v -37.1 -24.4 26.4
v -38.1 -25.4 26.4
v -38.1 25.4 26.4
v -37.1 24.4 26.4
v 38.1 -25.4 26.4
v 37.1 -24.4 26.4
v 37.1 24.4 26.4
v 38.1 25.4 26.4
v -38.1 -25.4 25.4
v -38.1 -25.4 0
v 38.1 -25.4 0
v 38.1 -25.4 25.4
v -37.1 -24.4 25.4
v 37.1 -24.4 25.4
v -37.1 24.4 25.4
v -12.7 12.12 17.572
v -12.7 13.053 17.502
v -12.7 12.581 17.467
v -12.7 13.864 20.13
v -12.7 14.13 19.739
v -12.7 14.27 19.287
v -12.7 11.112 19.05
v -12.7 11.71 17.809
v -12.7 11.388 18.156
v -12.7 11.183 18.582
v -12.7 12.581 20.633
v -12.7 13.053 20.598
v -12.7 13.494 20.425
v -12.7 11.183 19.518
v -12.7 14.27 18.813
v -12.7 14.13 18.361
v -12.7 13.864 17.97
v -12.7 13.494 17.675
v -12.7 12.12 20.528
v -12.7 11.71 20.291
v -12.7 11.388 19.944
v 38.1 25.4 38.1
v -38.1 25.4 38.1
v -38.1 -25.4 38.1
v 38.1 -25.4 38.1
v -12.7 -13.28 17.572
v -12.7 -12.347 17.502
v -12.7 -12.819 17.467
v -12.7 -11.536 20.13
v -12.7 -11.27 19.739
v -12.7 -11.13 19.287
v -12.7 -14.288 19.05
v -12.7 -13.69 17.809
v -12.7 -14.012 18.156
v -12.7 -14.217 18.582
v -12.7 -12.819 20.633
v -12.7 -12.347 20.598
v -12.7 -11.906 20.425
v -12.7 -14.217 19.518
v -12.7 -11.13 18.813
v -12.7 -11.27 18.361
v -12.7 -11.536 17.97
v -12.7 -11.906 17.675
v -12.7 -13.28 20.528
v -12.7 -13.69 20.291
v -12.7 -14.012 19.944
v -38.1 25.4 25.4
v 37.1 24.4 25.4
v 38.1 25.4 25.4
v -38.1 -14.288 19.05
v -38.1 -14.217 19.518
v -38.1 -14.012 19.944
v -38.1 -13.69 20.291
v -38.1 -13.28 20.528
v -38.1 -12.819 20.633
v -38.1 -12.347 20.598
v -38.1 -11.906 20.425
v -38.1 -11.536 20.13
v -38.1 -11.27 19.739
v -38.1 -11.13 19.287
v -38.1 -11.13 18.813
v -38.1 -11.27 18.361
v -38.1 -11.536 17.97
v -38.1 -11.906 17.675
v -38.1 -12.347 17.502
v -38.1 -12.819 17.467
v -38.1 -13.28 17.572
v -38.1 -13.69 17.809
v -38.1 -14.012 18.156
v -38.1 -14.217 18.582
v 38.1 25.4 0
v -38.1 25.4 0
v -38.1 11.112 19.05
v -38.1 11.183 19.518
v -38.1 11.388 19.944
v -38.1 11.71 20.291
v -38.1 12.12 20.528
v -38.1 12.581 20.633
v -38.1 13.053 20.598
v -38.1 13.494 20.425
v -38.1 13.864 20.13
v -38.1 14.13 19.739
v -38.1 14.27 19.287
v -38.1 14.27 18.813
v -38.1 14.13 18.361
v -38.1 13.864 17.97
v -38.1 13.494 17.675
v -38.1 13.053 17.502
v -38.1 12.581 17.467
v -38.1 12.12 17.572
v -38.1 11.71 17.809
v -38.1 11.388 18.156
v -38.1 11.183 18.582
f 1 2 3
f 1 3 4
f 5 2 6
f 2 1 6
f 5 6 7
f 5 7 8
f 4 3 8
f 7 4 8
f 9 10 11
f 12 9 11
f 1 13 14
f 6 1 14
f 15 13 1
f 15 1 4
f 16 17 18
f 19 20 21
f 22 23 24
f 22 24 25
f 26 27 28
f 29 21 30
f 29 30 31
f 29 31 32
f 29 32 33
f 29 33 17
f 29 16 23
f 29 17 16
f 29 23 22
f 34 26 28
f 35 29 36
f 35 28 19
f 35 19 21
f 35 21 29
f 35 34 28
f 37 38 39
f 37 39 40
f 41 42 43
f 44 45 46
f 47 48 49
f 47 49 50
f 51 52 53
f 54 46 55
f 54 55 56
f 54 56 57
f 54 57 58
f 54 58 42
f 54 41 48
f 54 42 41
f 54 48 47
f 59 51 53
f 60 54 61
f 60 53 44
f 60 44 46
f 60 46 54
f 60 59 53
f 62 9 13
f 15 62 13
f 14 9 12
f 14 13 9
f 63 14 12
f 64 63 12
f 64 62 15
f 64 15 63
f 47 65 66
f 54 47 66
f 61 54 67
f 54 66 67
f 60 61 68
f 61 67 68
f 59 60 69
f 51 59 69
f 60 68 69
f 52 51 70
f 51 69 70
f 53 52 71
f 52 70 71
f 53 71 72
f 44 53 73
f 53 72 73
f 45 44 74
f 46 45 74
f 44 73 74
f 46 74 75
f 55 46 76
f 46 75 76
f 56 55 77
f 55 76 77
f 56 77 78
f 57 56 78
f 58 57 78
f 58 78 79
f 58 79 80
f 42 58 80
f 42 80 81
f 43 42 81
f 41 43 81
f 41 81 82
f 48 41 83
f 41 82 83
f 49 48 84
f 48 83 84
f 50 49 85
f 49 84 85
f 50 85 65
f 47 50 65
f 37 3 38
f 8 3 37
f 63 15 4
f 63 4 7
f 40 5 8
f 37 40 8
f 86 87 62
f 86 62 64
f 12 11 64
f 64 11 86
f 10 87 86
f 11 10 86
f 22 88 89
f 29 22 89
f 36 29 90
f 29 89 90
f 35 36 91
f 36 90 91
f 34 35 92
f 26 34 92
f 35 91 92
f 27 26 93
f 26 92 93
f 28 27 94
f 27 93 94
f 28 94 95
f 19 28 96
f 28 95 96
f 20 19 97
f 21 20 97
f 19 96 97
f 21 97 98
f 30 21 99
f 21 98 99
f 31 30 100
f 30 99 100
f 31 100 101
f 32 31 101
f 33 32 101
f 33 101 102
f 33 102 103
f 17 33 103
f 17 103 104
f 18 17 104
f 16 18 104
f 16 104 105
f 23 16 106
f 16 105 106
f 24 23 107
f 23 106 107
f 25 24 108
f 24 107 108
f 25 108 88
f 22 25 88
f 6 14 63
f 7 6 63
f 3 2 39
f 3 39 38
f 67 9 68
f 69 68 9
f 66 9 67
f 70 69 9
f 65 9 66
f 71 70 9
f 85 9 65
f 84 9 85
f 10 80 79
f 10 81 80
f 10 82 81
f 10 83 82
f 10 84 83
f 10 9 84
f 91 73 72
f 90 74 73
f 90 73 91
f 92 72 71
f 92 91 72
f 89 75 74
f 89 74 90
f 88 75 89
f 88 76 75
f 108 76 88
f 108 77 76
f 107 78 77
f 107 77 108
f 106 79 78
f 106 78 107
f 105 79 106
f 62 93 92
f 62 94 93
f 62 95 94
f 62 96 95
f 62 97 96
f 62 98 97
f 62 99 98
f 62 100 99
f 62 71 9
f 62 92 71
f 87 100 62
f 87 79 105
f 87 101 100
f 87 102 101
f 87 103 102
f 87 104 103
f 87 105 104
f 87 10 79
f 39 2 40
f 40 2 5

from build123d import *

# Parameters (mm, degrees)
F0_W     = 76.2
F0_H     = 50.8
F1_DEPTH = 38.1
F4_W     = 76.2
F4_H     = 50.8
F4_W_2   = 74.2
F4_H_2   = 48.8
F5_DEPTH = 1
F2_R     = 1.5875
F6_DEPTH = 25.4


with BuildPart() as f1:
    # F0 (on Top) → F1 (new body)
    with BuildSketch(Plane.XY):
        Rectangle(F0_W, F0_H)
    extrude(amount=F1_DEPTH)

    # F4 (on offset) → F5 (cut)
    with BuildSketch(Plane.XY.offset(25.4)):
        Rectangle(F4_W, F4_H)
        Rectangle(F4_W_2, F4_H_2, mode=Mode.SUBTRACT)
    extrude(amount=F5_DEPTH, mode=Mode.SUBTRACT)

    # F2 (on face) → F6 (cut)
    with BuildSketch(Plane(origin=(-38.1, 0, 0), x_dir=(0, -1, 0), z_dir=(-1, 0, 0))):
        with Locations((-12.7, 19.05)):
            Circle(F2_R)
        with Locations((12.7, 19.05)):
            Circle(F2_R)
    extrude(amount=-F6_DEPTH, mode=Mode.SUBTRACT)


solid = f1.part
